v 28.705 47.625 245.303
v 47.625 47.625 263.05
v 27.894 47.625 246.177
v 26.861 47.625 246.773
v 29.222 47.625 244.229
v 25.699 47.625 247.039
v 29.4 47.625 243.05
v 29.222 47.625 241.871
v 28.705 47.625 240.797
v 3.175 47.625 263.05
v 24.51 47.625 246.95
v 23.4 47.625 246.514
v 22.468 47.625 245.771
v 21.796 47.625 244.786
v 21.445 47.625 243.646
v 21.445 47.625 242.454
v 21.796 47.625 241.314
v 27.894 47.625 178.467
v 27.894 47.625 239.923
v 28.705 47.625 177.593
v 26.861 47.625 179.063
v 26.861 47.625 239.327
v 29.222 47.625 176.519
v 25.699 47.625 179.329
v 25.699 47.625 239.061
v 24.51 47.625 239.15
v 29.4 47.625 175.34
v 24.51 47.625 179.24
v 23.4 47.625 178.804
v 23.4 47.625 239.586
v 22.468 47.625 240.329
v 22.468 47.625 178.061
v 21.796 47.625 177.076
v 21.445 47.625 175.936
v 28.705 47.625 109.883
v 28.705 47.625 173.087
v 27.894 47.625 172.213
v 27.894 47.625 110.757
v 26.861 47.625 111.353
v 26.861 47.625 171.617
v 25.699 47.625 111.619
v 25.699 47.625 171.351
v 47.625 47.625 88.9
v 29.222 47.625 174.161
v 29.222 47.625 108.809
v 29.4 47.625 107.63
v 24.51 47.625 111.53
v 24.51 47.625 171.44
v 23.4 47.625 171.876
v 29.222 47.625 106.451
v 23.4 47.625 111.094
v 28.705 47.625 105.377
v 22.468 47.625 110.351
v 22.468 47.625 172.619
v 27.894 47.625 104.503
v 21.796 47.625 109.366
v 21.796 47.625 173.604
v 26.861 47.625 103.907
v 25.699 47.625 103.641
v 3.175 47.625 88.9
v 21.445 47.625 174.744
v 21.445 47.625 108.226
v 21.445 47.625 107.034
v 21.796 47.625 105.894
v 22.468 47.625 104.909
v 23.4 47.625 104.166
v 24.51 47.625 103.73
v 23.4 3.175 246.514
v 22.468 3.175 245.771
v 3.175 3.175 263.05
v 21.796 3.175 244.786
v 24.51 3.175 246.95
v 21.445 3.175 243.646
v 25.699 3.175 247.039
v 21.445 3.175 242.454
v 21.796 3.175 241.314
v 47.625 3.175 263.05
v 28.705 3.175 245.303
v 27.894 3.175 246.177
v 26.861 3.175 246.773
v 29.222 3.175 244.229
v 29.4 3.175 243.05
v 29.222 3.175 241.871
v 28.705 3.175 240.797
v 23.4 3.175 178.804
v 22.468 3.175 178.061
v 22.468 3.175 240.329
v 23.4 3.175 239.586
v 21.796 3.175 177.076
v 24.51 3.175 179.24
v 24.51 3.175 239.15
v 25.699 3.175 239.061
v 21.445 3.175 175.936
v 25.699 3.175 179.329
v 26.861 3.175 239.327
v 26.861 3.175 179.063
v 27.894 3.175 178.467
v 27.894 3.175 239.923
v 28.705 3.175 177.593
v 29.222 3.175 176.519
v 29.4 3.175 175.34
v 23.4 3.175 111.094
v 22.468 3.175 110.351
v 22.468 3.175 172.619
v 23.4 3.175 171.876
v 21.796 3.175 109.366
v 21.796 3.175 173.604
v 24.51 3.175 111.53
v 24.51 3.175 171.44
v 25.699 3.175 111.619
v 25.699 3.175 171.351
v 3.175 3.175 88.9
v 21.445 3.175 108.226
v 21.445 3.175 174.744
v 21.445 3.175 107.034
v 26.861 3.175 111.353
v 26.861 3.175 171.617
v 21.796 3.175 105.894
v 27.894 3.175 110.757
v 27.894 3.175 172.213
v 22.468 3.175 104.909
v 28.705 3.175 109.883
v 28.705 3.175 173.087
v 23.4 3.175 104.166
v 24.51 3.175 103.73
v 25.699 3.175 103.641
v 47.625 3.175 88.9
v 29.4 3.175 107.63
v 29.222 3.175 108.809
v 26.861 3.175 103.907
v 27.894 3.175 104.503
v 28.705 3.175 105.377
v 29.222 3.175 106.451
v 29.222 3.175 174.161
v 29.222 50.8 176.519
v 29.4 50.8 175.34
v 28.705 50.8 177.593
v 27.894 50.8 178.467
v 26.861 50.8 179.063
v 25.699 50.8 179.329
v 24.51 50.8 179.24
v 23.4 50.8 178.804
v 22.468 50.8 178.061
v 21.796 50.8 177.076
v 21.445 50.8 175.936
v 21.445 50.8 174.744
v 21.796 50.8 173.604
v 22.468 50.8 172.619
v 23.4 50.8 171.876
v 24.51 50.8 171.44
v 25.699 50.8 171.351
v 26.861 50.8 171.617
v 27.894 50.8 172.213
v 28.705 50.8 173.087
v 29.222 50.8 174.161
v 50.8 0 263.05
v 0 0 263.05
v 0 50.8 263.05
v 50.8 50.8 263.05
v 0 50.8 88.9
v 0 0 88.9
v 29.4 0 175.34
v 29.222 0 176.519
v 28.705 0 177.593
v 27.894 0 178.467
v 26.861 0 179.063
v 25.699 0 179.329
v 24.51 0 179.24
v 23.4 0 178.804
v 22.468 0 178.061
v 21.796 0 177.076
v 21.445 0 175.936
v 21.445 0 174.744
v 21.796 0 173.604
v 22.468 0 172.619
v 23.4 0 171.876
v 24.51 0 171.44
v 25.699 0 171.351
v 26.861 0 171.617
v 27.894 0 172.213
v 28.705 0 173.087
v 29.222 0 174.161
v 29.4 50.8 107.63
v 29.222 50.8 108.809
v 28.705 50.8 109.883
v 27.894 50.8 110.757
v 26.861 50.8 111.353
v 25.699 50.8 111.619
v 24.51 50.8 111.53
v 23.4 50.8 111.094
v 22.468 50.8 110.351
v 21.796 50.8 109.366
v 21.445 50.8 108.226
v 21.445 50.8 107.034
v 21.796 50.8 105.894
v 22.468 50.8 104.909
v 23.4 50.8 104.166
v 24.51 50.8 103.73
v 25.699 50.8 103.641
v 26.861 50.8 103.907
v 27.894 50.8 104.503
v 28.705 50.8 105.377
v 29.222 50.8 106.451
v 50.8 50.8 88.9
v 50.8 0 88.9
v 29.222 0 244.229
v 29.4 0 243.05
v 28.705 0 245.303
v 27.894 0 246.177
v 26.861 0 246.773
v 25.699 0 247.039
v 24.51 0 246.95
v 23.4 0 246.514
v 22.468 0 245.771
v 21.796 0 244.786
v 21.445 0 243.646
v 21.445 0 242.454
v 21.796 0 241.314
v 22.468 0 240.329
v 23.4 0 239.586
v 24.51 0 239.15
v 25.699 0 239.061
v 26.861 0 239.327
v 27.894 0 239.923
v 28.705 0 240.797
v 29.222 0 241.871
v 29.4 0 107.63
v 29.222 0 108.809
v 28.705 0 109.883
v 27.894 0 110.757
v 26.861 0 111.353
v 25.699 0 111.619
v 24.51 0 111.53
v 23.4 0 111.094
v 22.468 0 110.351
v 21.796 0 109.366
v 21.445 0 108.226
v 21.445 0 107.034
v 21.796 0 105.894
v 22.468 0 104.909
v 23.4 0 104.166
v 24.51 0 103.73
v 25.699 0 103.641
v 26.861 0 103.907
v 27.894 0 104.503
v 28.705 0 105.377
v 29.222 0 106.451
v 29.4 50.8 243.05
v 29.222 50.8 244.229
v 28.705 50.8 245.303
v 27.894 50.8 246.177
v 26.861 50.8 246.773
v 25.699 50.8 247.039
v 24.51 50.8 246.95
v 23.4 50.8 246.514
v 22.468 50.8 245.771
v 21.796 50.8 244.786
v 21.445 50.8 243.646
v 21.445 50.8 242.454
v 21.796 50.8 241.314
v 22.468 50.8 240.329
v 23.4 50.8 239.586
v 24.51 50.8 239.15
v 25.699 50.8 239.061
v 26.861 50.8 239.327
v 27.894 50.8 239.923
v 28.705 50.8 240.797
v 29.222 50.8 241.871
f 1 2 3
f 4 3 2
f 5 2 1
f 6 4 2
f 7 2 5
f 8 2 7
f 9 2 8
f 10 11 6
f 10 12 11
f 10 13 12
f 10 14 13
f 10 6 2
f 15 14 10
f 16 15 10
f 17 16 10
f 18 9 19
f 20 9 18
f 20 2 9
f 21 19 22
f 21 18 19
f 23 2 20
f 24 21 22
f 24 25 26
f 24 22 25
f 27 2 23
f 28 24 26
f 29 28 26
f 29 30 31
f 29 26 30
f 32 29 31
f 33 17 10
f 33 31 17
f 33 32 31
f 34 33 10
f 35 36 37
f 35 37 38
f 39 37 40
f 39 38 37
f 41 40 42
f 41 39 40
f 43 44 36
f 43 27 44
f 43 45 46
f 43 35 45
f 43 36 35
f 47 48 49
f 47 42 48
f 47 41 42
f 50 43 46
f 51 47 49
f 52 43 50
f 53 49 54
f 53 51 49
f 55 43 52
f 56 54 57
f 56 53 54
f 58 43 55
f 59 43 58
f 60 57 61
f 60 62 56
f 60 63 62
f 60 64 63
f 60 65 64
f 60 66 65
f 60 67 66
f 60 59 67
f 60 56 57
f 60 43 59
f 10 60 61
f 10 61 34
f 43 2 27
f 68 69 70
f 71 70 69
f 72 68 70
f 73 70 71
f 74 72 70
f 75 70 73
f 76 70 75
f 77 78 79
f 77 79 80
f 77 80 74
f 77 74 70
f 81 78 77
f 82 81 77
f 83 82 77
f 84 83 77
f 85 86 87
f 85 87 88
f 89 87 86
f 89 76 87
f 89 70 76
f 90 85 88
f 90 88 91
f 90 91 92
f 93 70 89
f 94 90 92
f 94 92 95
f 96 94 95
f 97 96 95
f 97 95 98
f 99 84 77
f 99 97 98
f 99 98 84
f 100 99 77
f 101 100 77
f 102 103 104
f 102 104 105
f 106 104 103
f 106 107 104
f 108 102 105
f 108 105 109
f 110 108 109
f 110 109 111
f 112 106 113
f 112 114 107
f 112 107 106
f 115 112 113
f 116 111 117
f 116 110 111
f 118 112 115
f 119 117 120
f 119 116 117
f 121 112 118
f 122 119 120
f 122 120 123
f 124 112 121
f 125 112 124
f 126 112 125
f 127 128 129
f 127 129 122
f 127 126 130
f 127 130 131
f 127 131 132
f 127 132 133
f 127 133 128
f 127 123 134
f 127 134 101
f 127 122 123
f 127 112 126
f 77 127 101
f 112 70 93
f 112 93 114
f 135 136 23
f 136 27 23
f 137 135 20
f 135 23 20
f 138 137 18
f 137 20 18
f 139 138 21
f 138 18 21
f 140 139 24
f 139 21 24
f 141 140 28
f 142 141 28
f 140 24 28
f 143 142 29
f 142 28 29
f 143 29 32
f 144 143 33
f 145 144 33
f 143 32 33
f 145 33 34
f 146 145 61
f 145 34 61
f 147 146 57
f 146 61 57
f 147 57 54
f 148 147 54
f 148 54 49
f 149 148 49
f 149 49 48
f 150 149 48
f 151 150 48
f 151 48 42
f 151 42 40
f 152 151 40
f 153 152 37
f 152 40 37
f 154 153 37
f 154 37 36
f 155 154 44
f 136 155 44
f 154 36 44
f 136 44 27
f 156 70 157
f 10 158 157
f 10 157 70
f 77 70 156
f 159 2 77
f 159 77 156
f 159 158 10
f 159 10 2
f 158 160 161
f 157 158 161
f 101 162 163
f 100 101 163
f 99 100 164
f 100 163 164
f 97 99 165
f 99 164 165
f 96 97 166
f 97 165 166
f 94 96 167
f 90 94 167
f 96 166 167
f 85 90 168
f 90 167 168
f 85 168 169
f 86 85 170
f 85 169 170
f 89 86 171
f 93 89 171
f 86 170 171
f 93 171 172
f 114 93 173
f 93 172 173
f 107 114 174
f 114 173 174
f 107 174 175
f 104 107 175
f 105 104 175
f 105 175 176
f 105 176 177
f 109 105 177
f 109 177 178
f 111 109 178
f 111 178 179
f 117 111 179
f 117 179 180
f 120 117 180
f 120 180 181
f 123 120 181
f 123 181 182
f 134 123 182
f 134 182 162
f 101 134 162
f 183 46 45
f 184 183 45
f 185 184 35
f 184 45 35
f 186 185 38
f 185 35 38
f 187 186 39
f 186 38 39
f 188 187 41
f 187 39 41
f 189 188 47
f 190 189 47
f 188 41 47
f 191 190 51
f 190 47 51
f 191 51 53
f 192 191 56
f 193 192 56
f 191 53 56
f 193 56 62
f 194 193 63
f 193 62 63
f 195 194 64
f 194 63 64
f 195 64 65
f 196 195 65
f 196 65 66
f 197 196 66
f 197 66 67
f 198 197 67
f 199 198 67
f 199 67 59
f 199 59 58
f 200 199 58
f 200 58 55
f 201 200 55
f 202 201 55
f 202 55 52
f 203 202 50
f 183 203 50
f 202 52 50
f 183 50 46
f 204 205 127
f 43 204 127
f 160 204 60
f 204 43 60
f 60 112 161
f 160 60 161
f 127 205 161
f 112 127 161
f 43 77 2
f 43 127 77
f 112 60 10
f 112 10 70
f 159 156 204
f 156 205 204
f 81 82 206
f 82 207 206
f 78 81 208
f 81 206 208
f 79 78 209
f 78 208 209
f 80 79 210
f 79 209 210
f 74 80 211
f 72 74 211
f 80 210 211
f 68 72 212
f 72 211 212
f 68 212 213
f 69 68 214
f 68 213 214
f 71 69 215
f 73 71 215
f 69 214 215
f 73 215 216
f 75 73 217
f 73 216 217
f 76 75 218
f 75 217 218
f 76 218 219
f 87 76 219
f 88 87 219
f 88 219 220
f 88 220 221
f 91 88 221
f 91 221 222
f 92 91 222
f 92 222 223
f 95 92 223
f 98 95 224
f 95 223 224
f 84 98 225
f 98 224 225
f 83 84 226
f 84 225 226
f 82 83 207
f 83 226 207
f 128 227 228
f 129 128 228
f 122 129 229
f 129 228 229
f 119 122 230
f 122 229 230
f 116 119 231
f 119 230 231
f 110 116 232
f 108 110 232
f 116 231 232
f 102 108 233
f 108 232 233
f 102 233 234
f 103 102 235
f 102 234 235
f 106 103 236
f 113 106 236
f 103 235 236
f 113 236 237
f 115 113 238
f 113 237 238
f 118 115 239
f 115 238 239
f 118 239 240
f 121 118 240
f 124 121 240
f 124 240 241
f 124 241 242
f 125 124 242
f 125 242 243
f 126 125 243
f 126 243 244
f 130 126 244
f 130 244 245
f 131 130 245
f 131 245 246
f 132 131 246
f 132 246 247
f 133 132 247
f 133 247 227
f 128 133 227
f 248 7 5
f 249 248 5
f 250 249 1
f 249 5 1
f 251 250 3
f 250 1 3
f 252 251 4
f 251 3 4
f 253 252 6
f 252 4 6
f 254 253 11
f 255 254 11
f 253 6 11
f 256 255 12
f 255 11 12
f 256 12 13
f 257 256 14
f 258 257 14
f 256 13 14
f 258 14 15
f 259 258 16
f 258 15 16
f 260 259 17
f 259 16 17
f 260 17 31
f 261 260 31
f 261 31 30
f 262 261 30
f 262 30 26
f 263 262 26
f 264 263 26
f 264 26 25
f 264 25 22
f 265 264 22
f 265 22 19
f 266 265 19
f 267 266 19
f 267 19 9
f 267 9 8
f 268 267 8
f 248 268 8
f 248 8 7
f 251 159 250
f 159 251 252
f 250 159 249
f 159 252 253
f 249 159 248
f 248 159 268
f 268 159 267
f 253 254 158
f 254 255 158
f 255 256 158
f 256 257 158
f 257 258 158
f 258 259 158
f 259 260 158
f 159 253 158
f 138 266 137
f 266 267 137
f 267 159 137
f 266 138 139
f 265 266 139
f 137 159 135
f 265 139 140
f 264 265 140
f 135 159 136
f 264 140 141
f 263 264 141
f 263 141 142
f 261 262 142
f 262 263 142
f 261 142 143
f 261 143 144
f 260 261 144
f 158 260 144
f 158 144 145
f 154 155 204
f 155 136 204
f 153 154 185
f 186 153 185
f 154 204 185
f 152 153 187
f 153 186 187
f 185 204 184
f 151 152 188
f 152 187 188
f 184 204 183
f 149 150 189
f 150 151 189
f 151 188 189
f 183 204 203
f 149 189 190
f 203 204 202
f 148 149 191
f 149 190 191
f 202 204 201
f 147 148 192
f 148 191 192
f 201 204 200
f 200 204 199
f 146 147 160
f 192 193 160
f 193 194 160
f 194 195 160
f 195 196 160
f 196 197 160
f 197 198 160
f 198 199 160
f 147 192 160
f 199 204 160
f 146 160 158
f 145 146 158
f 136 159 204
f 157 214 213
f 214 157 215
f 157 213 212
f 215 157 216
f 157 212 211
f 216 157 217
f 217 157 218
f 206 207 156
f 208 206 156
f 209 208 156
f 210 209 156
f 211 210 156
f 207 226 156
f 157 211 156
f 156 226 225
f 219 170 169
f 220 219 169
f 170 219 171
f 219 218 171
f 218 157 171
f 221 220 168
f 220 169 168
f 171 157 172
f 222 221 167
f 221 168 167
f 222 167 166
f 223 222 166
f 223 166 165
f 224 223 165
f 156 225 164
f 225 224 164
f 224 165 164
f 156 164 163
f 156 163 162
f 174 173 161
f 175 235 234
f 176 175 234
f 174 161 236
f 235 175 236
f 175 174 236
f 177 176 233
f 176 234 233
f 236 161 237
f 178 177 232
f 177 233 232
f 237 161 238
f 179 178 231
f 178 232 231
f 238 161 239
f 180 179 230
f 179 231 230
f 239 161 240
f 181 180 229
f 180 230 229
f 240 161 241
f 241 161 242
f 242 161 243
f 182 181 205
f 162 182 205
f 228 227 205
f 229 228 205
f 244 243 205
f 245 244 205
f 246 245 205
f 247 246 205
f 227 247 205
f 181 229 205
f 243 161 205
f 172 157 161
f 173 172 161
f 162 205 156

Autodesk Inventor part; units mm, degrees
ref_plane "YZ Plane" through (0, 0, 0) normal (1, 0, 0) x (0, 1, 0)
ref_plane "XZ Plane" through (0, 0, 0) normal (0, 1, 0) x (-1, 0, 0)
ref_plane "XY Plane" through (0, 0, 0) normal (0, 0, 1) x (1, 0, 0)
sketch "Sketch1" plane through (0, 0, 0) normal (0, 0, 1) x (1, 0, 0)
  line L0 (0, 0) -> (50.8, 0)
  line L1 (50.8, 0) -> (50.8, 50.8)
  line L2 (50.8, 50.8) -> (0, 50.8)
  line L3 (0, 50.8) -> (0, 0)
  line L4 (3.175, 3.175) -> (47.625, 3.175)
  line L5 (47.625, 3.175) -> (47.625, 47.625)
  line L6 (47.625, 47.625) -> (3.175, 47.625)
  line L7 (3.175, 47.625) -> (3.175, 3.175)
  dimension "d0" = 50.8
  dimension "d1" = 50.8
  dimension "d2" = 3.175
extrude "Extrusion1" add sketch "Sketch1" along normal blind 263.05
sketch "Sketch2" plane through (0, 0, 0) normal (0, -1, 0) x (1, 0, 0)
  circle A0 centre (25.4, 107.63) radius 4
  line L0 (0, 0) -> (50.8, 0) projected
  circle A1 centre (25.4, 175.34) radius 4
  circle A2 centre (25.4, 243.05) radius 4
  point P0 (25.4, 0)
  dimension "d5" = 8
  dimension "d6" = 107.63
  dimension "d7" = 8
  dimension "d8" = 8
  dimension "d9" = 67.71
  dimension "d10" = 67.71
extrude "Extrusion2" cut sketch "Sketch2" against normal through all
sketch "Sketch3" plane through (0, 0, 0) normal (0, -1, 0) x (1, 0, 0)
  line L0 (50.8, 0) -> (50.8, 263.05) projected
  line L1 (0, 0) -> (50.8, 0)
  line L2 (50.8, 0) -> (50.8, 88.9)
  line L3 (50.8, 88.9) -> (0, 88.9)
  line L4 (0, 88.9) -> (0, 0)
  dimension "d13" = 88.9
extrude "Extrusion3" cut sketch "Sketch3" against normal through all
properties part number "ST01" material "Aluminum 6061"
